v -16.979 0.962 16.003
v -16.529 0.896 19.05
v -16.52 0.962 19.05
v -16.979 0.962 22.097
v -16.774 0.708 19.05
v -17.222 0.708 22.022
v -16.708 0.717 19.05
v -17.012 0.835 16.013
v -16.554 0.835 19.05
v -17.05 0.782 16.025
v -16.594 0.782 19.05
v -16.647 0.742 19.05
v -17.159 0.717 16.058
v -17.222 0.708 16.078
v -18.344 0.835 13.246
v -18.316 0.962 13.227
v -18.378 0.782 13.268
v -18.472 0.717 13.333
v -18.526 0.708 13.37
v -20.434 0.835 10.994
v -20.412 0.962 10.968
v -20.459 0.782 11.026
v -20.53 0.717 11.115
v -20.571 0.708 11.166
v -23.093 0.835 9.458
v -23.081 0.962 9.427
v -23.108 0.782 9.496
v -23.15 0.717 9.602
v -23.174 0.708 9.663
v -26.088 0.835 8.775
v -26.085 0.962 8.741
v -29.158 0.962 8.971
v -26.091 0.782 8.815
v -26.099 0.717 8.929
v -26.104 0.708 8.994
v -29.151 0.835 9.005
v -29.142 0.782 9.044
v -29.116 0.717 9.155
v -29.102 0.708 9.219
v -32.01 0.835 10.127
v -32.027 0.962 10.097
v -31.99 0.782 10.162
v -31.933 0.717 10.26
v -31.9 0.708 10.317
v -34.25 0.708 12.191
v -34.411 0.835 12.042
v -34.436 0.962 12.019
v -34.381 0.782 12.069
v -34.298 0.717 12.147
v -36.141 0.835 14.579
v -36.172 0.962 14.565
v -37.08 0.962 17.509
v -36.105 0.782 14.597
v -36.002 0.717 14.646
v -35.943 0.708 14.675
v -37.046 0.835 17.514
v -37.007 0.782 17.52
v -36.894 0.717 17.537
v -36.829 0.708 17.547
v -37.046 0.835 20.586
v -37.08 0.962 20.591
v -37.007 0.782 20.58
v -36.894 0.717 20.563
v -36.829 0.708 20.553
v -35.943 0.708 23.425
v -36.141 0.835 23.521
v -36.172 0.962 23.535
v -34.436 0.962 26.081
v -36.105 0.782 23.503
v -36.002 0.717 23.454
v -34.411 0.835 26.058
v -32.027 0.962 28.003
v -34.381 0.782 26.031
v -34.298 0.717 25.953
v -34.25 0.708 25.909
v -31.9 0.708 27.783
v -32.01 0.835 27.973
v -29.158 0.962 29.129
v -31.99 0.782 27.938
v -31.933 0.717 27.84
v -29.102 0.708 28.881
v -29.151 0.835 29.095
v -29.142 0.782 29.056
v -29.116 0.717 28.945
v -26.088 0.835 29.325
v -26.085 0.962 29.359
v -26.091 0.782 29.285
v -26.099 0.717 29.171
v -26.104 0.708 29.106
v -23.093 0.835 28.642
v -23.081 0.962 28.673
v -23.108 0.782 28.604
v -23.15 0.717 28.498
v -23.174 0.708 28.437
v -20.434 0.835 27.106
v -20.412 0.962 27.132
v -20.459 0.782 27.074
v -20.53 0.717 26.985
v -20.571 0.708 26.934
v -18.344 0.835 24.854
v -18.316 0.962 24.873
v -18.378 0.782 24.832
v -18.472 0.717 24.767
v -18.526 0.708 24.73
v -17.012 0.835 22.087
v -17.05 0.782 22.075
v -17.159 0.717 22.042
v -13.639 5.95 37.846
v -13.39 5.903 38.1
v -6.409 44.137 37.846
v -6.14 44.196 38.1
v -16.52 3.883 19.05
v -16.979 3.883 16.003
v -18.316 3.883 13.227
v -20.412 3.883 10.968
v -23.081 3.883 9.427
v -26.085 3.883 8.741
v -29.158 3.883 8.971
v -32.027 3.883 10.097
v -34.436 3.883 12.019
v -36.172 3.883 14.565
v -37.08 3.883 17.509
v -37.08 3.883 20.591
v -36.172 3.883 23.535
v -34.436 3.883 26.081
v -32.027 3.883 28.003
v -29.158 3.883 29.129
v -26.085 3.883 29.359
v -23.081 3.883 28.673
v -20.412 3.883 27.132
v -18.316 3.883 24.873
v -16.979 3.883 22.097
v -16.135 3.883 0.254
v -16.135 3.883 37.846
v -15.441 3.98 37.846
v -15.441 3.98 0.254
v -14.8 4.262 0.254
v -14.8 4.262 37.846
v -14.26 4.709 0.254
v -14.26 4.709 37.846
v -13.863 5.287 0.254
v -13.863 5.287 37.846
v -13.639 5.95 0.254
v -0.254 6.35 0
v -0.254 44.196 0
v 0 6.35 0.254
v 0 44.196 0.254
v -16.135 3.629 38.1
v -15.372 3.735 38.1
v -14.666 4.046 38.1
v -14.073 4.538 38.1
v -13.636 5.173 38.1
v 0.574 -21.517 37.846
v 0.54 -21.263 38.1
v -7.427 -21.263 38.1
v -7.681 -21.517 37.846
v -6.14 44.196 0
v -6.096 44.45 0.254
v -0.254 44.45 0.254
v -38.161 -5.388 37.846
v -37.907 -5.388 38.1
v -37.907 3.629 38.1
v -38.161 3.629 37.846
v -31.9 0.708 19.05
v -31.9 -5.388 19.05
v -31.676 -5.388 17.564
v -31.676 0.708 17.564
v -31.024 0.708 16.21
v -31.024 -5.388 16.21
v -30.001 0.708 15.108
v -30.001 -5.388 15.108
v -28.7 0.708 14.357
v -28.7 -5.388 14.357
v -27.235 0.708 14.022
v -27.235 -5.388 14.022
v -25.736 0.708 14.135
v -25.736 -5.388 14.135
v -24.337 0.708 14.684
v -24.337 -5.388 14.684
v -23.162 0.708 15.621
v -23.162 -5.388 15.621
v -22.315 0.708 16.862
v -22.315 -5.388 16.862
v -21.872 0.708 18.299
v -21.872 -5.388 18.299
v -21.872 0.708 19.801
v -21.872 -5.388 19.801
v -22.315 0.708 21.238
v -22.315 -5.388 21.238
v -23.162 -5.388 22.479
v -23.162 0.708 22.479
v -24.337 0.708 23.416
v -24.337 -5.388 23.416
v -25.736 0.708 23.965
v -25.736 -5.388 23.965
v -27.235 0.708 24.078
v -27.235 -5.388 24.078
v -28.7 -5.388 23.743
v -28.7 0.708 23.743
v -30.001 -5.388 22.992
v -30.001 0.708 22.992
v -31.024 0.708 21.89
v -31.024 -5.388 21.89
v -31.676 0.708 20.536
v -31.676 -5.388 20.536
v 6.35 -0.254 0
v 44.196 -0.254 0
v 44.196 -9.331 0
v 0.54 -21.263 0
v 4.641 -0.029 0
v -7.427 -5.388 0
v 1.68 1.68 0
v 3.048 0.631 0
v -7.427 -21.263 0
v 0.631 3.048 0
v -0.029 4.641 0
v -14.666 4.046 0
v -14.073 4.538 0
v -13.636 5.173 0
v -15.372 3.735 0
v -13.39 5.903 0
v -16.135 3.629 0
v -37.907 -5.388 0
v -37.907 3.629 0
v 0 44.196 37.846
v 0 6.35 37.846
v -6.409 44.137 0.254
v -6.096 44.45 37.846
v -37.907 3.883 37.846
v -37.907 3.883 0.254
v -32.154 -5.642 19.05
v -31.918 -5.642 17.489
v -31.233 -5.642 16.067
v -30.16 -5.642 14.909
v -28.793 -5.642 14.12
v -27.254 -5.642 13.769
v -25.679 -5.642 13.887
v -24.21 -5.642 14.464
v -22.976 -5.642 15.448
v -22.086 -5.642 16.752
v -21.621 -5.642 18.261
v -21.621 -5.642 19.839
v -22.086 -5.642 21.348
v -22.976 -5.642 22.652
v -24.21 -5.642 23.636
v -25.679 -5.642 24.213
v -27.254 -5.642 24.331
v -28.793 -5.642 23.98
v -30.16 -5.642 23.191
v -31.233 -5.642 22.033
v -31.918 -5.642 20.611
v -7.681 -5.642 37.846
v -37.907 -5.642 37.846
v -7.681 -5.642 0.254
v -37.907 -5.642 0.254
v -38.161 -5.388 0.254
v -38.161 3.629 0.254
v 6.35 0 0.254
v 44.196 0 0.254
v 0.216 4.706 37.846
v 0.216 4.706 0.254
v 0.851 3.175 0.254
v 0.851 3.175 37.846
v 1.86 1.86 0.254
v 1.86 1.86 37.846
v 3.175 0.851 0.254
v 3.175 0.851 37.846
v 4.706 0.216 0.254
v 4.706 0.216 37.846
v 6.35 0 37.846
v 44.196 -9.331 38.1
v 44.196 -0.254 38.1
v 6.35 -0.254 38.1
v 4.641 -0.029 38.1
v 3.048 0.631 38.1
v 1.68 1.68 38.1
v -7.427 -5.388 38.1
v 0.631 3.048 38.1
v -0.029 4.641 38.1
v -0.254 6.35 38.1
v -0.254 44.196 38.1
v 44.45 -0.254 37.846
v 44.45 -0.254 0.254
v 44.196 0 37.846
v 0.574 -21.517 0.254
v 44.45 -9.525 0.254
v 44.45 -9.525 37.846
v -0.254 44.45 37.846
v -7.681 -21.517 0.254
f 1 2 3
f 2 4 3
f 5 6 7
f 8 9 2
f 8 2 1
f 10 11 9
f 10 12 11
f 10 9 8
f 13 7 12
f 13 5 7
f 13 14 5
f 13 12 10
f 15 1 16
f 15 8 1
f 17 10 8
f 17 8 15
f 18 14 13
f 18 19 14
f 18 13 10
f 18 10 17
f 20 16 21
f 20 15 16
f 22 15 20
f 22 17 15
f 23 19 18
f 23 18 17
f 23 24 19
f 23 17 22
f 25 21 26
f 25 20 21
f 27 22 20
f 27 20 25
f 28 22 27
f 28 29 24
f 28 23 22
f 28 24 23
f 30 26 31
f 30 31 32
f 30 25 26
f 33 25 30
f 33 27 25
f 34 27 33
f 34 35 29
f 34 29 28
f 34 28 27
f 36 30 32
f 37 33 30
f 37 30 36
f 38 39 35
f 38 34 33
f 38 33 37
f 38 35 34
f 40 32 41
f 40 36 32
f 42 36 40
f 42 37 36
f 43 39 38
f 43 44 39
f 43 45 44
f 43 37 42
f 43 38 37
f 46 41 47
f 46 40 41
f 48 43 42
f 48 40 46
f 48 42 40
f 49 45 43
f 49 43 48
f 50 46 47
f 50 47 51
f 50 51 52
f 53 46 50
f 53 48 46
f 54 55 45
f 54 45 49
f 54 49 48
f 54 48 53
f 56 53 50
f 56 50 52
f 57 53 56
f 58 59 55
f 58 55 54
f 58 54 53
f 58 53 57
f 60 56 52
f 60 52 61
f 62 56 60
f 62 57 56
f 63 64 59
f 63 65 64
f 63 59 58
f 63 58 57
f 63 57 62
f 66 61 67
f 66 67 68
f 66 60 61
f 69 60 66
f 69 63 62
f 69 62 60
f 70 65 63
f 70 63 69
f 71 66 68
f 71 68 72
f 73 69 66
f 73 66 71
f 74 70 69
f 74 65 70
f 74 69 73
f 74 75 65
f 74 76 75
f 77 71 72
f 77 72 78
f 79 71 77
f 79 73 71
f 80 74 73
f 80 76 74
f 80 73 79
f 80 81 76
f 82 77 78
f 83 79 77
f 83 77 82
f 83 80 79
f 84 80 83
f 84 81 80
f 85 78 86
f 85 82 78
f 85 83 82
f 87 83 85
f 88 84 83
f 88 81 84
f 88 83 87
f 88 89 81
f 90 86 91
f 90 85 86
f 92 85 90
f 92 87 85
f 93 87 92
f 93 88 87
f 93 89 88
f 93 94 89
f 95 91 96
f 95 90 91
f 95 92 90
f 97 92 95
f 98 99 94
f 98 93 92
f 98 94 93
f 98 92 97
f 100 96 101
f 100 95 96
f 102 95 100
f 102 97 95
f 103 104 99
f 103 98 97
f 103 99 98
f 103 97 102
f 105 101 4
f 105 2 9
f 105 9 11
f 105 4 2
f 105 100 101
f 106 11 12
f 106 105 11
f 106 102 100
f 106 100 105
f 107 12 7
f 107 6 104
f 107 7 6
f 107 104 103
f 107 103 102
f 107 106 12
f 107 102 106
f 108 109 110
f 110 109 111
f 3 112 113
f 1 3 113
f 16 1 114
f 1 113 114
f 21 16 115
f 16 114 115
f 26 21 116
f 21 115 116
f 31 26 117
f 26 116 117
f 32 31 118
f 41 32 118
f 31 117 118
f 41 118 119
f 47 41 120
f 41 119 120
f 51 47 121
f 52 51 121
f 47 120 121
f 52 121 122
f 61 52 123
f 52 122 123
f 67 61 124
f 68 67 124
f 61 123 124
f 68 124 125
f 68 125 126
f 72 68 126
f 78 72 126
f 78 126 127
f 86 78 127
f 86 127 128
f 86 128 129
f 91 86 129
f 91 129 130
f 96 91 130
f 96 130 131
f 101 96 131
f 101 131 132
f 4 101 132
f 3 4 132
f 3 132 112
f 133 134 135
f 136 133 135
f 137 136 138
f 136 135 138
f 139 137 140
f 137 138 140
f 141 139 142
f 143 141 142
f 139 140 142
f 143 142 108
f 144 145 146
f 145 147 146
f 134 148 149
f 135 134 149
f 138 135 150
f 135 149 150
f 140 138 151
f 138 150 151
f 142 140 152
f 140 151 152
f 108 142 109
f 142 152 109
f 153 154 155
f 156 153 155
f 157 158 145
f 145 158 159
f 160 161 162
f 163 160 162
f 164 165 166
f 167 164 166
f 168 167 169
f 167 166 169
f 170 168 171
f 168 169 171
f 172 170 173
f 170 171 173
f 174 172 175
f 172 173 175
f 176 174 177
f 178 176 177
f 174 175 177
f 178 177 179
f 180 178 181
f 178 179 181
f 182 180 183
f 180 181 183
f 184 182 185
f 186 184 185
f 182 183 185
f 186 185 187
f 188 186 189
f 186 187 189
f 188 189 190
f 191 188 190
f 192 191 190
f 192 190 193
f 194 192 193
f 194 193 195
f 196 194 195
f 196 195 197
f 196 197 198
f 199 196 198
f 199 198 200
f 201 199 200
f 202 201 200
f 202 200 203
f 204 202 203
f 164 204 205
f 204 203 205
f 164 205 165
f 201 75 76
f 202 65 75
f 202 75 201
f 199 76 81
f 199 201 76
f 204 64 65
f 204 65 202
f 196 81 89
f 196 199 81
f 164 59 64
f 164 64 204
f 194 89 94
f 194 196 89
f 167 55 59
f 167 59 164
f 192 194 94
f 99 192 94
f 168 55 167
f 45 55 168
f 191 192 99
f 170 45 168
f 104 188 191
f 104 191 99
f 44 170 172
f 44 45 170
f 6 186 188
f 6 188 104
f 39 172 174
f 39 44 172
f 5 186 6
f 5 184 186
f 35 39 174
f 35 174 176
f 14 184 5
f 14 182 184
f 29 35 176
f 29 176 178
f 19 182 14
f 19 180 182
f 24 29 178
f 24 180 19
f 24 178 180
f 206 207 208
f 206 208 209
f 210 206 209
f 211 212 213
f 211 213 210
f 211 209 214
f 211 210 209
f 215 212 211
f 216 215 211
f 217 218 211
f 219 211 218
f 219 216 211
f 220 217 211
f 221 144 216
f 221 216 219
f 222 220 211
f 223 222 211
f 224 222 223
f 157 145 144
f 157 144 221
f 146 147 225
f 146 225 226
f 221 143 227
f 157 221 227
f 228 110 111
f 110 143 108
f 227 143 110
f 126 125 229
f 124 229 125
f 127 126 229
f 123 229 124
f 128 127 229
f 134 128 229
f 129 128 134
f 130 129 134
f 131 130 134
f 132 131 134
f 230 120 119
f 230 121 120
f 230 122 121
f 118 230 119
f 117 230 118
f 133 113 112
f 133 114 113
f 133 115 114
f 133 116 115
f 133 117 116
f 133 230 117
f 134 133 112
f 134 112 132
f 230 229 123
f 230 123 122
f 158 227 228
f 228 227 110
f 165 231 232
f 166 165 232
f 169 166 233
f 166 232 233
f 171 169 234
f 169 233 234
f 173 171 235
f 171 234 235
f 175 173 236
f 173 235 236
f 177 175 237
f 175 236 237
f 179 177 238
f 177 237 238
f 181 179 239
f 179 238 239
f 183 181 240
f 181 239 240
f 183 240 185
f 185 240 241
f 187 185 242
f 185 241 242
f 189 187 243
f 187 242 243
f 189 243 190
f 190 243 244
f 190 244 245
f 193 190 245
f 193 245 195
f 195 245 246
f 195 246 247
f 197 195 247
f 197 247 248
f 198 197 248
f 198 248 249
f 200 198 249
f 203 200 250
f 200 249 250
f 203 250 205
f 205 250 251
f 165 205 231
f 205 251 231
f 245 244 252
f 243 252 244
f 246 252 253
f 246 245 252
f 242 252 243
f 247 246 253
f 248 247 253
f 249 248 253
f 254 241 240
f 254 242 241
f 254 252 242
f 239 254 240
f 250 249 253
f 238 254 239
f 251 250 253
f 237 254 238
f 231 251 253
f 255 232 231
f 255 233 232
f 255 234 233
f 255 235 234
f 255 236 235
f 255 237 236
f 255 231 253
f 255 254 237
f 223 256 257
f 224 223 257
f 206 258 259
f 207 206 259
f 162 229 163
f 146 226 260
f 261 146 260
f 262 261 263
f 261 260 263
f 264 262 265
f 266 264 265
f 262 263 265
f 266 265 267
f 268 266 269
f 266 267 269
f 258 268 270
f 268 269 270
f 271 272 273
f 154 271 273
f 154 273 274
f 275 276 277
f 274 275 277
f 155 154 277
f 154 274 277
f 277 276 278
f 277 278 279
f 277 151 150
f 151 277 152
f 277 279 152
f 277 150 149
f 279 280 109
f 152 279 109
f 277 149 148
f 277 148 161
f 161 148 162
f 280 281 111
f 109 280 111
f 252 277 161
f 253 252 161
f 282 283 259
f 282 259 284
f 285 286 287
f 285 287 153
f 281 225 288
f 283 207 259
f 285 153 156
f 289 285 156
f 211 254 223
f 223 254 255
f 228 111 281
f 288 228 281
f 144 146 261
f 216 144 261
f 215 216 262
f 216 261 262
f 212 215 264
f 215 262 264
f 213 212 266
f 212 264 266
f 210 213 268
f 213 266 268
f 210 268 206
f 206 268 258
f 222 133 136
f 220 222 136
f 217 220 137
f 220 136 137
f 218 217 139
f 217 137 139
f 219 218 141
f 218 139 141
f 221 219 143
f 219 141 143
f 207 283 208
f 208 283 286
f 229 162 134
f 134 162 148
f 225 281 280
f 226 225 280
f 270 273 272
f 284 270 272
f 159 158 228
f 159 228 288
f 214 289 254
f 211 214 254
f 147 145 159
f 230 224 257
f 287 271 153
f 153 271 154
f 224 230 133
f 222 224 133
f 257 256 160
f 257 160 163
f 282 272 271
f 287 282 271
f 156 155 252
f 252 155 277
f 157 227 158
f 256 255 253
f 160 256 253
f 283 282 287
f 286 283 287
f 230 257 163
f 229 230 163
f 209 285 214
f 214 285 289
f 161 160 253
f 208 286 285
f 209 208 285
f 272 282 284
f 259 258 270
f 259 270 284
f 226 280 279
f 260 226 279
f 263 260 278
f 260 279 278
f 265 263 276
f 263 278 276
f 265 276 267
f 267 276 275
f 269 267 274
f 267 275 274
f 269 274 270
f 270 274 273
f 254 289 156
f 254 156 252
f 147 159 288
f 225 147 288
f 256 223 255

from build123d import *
from OCP.BRepFilletAPI import BRepFilletAPI_MakeChamfer

# Parameters (mm, degrees)
BOSS_EXTRUDE1_DEPTH                                  = 38.1
CBORE_FOR_3_8_BINDING_HEAD_MACHINE_SCREW_D           = 10.0838
CBORE_FOR_3_8_BINDING_HEAD_MACHINE_SCREW_CBORE_D     = 20.6756
CBORE_FOR_3_8_BINDING_HEAD_MACHINE_SCREW_CBORE_DEPTH = 3.175
FILLET1_R                                            = 2.54
FILLET2_R                                            = 6.35
CHAMFER1_SIZE                                        = 0.254
CHAMFER1_SIZE2                                       = 0.31888992
FILLET3_R                                            = 0.254
CHAMFER2_SIZE                                        = 0.254


with BuildPart() as part:
    # Sketch1 → Boss-Extrude1 (new body)
    with BuildSketch(Plane.XY):
        Polygon((0, 0), (44.45, 0), (44.45, -9.525), (0.5741924, -21.517102), (-7.6808076, -21.517102), (-7.6808076, -5.642102), (-38.1608076, -5.642102), (-38.1608076, 3.882898), (-14.0308076, 3.882898), (-6.35, 44.45), (0, 44.45), align=None)
    extrude(amount=BOSS_EXTRUDE1_DEPTH)

    # CBORE for 3/8 Binding Head Machine Screw1 (through all)
    with Locations(Plane(origin=(0, 3.882898, 0), x_dir=(1, 0, 0), z_dir=(0, 1, 0))):
        with Locations((-26.8578076, -19.05)):
            CounterBoreHole(CBORE_FOR_3_8_BINDING_HEAD_MACHINE_SCREW_D / 2, CBORE_FOR_3_8_BINDING_HEAD_MACHINE_SCREW_CBORE_D / 2, CBORE_FOR_3_8_BINDING_HEAD_MACHINE_SCREW_CBORE_DEPTH)

    # Fillet1
    fillet1_edges = [part.edges().sort_by_distance(p)[0] for p in [
        (-14.0308076, 3.882898, 19.05),
    ]]
    fillet(fillet1_edges, radius=FILLET1_R)

    # Fillet2
    fillet2_edges = [part.edges().sort_by_distance(p)[0] for p in [
        (0, 0, 19.05),
    ]]
    fillet(fillet2_edges, radius=FILLET2_R)

    # Chamfer1: one chamfer whose edges measure the first distance from different faces: ONE call of the kernel's chamfer builder (chamfer() names one face for all edges)
    chamfer1_edges_1 = [part.edges().sort_by_distance(p)[0] for p in [
        (25.4, 0, 0),
        (44.45, -4.7625, 0),
        (22.5120962, -15.521051, 0),
        (-3.5533076, -21.517102, 0),
        (-7.6808076, -13.579602, 0),
        (-9.994679571, 25.200189874, 38.1),
        (-22.9208076, -5.642102, 0),
        (-38.1608076, -0.879602, 0),
        (-9.994679571, 25.200189874, 0),
        (-3.175, 44.45, 0),
        (44.45, 0, 19.05),
        (-38.1608076, -5.642102, 19.05),
        (-38.1608076, 3.882898, 19.05),
        (0, 44.45, 19.05),
        (-38.1608076, -0.879602, 38.1),
        (-22.9208076, -5.642102, 38.1),
        (-7.6808076, -13.579602, 38.1),
        (-3.5533076, -21.517102, 38.1),
        (22.5120962, -15.521051, 38.1),
        (44.45, -4.7625, 38.1),
        (-27.147914139, 3.882898, 0),
        (-27.147914139, 3.882898, 38.1),
        (-14.514618931, 4.466907668, 0),
        (-14.514618931, 4.466907668, 38.1),
        (25.4, 0, 38.1),
        (0, 25.4, 0),
        (0, 25.4, 38.1),
        (1.859871939, 1.859871939, 0),
        (1.859871939, 1.859871939, 38.1),
        (-3.175, 44.45, 38.1),
    ]]
    chamfer1_edges_2 = [part.edges().sort_by_distance(p)[0] for p in [
        (-6.35, 44.45, 19.05),
    ]]
    chamfer1_side_2 = [part.faces().sort_by_distance(p)[0] for p in [
        (-3.175, 44.45, 19.05),
    ]]
    chamfer1 = BRepFilletAPI_MakeChamfer(part.part.solid().wrapped)
    for e in chamfer1_edges_1:
        chamfer1.Add(CHAMFER1_SIZE, e.wrapped)
    for e in chamfer1_edges_2:
        chamfer1.Add(CHAMFER1_SIZE, CHAMFER1_SIZE2, e.wrapped, chamfer1_side_2[0].wrapped)  # the first distance lies on this face
    add(Compound.cast(chamfer1.Shape()), mode=Mode.REPLACE)

    # Fillet3
    fillet3_edges = [part.edges().sort_by_distance(p)[0] for p in [
        (-37.1956076, 0.707898, 19.05),
    ]]
    fillet(fillet3_edges, radius=FILLET3_R)

    # Chamfer2
    chamfer2_edges = [part.edges().sort_by_distance(p)[0] for p in [
        (-21.8159076, -5.642102, 19.05),
    ]]
    chamfer(chamfer2_edges, length=CHAMFER2_SIZE)


solid = part.part
